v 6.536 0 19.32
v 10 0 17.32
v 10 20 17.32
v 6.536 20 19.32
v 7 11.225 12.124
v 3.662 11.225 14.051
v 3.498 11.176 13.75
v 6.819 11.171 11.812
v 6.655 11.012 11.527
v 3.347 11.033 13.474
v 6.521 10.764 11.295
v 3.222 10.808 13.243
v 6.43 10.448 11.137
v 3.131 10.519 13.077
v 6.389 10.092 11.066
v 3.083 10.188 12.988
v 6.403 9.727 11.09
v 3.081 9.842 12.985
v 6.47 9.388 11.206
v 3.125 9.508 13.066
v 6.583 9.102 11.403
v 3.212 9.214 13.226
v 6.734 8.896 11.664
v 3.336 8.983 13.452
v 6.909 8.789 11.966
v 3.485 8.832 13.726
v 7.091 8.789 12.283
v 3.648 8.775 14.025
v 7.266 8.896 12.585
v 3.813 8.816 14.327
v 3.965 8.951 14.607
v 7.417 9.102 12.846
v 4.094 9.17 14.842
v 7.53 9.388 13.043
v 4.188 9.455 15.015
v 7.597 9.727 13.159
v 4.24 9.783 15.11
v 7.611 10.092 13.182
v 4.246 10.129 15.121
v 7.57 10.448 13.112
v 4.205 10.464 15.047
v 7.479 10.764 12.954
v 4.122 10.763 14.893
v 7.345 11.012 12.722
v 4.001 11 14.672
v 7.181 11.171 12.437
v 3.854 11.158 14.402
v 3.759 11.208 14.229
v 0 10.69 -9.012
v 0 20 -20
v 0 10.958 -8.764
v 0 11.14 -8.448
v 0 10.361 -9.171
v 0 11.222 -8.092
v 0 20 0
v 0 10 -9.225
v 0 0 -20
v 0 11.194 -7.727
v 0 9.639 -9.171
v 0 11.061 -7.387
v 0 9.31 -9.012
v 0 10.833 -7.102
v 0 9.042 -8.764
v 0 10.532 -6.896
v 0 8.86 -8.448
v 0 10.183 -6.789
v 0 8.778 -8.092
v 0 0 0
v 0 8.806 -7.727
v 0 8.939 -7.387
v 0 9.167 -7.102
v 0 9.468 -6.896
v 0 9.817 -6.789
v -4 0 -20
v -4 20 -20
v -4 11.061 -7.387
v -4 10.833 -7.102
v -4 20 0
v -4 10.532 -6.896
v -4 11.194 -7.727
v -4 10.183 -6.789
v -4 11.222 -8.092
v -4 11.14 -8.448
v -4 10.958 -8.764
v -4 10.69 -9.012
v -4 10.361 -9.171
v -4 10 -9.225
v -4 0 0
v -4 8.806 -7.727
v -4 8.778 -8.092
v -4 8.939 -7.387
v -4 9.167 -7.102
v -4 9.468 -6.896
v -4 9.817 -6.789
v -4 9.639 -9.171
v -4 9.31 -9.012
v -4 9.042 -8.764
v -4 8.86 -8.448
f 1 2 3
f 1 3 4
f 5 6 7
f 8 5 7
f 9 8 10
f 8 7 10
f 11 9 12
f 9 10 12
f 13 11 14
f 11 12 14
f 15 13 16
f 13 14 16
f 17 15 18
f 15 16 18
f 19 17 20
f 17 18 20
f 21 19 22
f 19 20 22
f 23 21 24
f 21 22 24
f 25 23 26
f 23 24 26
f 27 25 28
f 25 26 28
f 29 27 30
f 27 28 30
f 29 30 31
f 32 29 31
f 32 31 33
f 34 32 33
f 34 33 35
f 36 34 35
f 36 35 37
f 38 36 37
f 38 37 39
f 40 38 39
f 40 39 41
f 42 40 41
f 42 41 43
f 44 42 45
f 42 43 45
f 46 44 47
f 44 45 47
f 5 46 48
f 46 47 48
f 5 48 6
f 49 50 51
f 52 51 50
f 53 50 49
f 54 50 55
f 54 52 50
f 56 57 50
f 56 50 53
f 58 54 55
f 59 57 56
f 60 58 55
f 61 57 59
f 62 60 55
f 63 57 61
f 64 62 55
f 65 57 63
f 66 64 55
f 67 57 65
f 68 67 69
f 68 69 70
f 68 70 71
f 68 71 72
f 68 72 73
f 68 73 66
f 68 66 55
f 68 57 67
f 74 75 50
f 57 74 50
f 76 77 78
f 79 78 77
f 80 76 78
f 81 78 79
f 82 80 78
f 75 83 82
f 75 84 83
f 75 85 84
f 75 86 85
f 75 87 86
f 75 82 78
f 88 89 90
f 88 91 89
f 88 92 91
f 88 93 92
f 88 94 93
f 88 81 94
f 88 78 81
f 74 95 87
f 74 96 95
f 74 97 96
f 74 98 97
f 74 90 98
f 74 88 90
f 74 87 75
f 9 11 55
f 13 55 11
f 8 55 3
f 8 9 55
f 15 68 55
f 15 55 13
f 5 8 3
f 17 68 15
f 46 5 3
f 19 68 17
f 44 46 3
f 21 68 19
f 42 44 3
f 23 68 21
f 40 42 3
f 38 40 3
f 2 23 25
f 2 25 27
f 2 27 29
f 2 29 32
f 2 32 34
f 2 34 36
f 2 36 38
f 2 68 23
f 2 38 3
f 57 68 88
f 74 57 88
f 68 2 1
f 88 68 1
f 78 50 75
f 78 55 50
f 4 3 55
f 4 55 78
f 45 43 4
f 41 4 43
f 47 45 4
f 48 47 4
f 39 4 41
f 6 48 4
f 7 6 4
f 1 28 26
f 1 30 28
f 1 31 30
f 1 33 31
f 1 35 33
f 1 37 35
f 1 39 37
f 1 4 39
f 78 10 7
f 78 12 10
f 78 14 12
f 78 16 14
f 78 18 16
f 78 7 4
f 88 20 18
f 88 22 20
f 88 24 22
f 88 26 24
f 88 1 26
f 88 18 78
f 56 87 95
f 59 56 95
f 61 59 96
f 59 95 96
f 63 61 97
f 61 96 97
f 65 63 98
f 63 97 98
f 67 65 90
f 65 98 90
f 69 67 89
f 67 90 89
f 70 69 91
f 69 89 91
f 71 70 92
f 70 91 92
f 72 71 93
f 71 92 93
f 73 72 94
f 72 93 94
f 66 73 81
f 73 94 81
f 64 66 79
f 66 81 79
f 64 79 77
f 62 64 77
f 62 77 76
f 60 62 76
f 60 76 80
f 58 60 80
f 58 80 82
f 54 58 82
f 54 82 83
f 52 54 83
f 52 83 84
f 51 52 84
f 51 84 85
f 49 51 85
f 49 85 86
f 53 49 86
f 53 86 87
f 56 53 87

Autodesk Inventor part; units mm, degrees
ref_plane "YZ Plane" through (0, 0, 0) normal (1, 0, 0) x (0, 1, 0)
ref_plane "XZ Plane" through (0, 0, 0) normal (0, 1, 0) x (-1, 0, 0)
ref_plane "XY Plane" through (0, 0, 0) normal (0, 0, 1) x (1, 0, 0)
sketch "Sketch1" plane through (0, 0, 0) normal (0, 1, 0) x (-1, 0, 0)
  line L0 (0, 0) -> (4, 0)
  line L1 (4, 0) -> (4, -20)
  line L2 (4, -20) -> (0, -20)
  line L3 (0, -20) -> (0, 0)
  line L4 (0, 0) -> (-10, 17.3205)
  line L5 (0, 0) -> (20, 0) construction
  line L6 (-10, 17.3205) -> (-6.5359, 19.3205)
  line L7 (-6.5359, 19.3205) -> (4, 0)
  dimension "d0" = 4
  dimension "d1" = 20
  dimension "d2" = 20
  dimension "d3" = 120
  dimension "d4" = 4
extrude "Extrusion1" add sketch "Sketch1" along normal blind 20
sketch "Sketch2" plane through (0, 0, 0) normal (1, 0, 0) x (0, 0, -1)
  line L0 (0, 0) -> (0, 20) projected
  line L1 (0, 0) -> (20, 0) projected
  point P0 (8, 10)
  point P1 (0, 10)
  dimension "d7" = 8
  dimension "d8" = 10
hole "Hole1" at (0, 10, -8) direction (-1, 0, 0) diameter 2.45 end through all
sketch "Sketch3" plane through (0, 0, 0) normal (0.8660254, 0, -0.5) x (-0.5, 0, -0.8660254)
  line L0 (0, 0) -> (0, 20) projected
  line L1 (-20, 20) -> (0, 20) projected
  point P0 (-14, 10)
  point P1 (0, 10)
  dimension "d16" = 14
  dimension "d17" = 10
hole "Hole2" at (7, 10, 12.1244) direction (-0.8660254, 0, 0.5) diameter 2.45 end through all
equation "\"d0\" = d4"
properties part number "150degreebracket" material "Iron, Malleable"
